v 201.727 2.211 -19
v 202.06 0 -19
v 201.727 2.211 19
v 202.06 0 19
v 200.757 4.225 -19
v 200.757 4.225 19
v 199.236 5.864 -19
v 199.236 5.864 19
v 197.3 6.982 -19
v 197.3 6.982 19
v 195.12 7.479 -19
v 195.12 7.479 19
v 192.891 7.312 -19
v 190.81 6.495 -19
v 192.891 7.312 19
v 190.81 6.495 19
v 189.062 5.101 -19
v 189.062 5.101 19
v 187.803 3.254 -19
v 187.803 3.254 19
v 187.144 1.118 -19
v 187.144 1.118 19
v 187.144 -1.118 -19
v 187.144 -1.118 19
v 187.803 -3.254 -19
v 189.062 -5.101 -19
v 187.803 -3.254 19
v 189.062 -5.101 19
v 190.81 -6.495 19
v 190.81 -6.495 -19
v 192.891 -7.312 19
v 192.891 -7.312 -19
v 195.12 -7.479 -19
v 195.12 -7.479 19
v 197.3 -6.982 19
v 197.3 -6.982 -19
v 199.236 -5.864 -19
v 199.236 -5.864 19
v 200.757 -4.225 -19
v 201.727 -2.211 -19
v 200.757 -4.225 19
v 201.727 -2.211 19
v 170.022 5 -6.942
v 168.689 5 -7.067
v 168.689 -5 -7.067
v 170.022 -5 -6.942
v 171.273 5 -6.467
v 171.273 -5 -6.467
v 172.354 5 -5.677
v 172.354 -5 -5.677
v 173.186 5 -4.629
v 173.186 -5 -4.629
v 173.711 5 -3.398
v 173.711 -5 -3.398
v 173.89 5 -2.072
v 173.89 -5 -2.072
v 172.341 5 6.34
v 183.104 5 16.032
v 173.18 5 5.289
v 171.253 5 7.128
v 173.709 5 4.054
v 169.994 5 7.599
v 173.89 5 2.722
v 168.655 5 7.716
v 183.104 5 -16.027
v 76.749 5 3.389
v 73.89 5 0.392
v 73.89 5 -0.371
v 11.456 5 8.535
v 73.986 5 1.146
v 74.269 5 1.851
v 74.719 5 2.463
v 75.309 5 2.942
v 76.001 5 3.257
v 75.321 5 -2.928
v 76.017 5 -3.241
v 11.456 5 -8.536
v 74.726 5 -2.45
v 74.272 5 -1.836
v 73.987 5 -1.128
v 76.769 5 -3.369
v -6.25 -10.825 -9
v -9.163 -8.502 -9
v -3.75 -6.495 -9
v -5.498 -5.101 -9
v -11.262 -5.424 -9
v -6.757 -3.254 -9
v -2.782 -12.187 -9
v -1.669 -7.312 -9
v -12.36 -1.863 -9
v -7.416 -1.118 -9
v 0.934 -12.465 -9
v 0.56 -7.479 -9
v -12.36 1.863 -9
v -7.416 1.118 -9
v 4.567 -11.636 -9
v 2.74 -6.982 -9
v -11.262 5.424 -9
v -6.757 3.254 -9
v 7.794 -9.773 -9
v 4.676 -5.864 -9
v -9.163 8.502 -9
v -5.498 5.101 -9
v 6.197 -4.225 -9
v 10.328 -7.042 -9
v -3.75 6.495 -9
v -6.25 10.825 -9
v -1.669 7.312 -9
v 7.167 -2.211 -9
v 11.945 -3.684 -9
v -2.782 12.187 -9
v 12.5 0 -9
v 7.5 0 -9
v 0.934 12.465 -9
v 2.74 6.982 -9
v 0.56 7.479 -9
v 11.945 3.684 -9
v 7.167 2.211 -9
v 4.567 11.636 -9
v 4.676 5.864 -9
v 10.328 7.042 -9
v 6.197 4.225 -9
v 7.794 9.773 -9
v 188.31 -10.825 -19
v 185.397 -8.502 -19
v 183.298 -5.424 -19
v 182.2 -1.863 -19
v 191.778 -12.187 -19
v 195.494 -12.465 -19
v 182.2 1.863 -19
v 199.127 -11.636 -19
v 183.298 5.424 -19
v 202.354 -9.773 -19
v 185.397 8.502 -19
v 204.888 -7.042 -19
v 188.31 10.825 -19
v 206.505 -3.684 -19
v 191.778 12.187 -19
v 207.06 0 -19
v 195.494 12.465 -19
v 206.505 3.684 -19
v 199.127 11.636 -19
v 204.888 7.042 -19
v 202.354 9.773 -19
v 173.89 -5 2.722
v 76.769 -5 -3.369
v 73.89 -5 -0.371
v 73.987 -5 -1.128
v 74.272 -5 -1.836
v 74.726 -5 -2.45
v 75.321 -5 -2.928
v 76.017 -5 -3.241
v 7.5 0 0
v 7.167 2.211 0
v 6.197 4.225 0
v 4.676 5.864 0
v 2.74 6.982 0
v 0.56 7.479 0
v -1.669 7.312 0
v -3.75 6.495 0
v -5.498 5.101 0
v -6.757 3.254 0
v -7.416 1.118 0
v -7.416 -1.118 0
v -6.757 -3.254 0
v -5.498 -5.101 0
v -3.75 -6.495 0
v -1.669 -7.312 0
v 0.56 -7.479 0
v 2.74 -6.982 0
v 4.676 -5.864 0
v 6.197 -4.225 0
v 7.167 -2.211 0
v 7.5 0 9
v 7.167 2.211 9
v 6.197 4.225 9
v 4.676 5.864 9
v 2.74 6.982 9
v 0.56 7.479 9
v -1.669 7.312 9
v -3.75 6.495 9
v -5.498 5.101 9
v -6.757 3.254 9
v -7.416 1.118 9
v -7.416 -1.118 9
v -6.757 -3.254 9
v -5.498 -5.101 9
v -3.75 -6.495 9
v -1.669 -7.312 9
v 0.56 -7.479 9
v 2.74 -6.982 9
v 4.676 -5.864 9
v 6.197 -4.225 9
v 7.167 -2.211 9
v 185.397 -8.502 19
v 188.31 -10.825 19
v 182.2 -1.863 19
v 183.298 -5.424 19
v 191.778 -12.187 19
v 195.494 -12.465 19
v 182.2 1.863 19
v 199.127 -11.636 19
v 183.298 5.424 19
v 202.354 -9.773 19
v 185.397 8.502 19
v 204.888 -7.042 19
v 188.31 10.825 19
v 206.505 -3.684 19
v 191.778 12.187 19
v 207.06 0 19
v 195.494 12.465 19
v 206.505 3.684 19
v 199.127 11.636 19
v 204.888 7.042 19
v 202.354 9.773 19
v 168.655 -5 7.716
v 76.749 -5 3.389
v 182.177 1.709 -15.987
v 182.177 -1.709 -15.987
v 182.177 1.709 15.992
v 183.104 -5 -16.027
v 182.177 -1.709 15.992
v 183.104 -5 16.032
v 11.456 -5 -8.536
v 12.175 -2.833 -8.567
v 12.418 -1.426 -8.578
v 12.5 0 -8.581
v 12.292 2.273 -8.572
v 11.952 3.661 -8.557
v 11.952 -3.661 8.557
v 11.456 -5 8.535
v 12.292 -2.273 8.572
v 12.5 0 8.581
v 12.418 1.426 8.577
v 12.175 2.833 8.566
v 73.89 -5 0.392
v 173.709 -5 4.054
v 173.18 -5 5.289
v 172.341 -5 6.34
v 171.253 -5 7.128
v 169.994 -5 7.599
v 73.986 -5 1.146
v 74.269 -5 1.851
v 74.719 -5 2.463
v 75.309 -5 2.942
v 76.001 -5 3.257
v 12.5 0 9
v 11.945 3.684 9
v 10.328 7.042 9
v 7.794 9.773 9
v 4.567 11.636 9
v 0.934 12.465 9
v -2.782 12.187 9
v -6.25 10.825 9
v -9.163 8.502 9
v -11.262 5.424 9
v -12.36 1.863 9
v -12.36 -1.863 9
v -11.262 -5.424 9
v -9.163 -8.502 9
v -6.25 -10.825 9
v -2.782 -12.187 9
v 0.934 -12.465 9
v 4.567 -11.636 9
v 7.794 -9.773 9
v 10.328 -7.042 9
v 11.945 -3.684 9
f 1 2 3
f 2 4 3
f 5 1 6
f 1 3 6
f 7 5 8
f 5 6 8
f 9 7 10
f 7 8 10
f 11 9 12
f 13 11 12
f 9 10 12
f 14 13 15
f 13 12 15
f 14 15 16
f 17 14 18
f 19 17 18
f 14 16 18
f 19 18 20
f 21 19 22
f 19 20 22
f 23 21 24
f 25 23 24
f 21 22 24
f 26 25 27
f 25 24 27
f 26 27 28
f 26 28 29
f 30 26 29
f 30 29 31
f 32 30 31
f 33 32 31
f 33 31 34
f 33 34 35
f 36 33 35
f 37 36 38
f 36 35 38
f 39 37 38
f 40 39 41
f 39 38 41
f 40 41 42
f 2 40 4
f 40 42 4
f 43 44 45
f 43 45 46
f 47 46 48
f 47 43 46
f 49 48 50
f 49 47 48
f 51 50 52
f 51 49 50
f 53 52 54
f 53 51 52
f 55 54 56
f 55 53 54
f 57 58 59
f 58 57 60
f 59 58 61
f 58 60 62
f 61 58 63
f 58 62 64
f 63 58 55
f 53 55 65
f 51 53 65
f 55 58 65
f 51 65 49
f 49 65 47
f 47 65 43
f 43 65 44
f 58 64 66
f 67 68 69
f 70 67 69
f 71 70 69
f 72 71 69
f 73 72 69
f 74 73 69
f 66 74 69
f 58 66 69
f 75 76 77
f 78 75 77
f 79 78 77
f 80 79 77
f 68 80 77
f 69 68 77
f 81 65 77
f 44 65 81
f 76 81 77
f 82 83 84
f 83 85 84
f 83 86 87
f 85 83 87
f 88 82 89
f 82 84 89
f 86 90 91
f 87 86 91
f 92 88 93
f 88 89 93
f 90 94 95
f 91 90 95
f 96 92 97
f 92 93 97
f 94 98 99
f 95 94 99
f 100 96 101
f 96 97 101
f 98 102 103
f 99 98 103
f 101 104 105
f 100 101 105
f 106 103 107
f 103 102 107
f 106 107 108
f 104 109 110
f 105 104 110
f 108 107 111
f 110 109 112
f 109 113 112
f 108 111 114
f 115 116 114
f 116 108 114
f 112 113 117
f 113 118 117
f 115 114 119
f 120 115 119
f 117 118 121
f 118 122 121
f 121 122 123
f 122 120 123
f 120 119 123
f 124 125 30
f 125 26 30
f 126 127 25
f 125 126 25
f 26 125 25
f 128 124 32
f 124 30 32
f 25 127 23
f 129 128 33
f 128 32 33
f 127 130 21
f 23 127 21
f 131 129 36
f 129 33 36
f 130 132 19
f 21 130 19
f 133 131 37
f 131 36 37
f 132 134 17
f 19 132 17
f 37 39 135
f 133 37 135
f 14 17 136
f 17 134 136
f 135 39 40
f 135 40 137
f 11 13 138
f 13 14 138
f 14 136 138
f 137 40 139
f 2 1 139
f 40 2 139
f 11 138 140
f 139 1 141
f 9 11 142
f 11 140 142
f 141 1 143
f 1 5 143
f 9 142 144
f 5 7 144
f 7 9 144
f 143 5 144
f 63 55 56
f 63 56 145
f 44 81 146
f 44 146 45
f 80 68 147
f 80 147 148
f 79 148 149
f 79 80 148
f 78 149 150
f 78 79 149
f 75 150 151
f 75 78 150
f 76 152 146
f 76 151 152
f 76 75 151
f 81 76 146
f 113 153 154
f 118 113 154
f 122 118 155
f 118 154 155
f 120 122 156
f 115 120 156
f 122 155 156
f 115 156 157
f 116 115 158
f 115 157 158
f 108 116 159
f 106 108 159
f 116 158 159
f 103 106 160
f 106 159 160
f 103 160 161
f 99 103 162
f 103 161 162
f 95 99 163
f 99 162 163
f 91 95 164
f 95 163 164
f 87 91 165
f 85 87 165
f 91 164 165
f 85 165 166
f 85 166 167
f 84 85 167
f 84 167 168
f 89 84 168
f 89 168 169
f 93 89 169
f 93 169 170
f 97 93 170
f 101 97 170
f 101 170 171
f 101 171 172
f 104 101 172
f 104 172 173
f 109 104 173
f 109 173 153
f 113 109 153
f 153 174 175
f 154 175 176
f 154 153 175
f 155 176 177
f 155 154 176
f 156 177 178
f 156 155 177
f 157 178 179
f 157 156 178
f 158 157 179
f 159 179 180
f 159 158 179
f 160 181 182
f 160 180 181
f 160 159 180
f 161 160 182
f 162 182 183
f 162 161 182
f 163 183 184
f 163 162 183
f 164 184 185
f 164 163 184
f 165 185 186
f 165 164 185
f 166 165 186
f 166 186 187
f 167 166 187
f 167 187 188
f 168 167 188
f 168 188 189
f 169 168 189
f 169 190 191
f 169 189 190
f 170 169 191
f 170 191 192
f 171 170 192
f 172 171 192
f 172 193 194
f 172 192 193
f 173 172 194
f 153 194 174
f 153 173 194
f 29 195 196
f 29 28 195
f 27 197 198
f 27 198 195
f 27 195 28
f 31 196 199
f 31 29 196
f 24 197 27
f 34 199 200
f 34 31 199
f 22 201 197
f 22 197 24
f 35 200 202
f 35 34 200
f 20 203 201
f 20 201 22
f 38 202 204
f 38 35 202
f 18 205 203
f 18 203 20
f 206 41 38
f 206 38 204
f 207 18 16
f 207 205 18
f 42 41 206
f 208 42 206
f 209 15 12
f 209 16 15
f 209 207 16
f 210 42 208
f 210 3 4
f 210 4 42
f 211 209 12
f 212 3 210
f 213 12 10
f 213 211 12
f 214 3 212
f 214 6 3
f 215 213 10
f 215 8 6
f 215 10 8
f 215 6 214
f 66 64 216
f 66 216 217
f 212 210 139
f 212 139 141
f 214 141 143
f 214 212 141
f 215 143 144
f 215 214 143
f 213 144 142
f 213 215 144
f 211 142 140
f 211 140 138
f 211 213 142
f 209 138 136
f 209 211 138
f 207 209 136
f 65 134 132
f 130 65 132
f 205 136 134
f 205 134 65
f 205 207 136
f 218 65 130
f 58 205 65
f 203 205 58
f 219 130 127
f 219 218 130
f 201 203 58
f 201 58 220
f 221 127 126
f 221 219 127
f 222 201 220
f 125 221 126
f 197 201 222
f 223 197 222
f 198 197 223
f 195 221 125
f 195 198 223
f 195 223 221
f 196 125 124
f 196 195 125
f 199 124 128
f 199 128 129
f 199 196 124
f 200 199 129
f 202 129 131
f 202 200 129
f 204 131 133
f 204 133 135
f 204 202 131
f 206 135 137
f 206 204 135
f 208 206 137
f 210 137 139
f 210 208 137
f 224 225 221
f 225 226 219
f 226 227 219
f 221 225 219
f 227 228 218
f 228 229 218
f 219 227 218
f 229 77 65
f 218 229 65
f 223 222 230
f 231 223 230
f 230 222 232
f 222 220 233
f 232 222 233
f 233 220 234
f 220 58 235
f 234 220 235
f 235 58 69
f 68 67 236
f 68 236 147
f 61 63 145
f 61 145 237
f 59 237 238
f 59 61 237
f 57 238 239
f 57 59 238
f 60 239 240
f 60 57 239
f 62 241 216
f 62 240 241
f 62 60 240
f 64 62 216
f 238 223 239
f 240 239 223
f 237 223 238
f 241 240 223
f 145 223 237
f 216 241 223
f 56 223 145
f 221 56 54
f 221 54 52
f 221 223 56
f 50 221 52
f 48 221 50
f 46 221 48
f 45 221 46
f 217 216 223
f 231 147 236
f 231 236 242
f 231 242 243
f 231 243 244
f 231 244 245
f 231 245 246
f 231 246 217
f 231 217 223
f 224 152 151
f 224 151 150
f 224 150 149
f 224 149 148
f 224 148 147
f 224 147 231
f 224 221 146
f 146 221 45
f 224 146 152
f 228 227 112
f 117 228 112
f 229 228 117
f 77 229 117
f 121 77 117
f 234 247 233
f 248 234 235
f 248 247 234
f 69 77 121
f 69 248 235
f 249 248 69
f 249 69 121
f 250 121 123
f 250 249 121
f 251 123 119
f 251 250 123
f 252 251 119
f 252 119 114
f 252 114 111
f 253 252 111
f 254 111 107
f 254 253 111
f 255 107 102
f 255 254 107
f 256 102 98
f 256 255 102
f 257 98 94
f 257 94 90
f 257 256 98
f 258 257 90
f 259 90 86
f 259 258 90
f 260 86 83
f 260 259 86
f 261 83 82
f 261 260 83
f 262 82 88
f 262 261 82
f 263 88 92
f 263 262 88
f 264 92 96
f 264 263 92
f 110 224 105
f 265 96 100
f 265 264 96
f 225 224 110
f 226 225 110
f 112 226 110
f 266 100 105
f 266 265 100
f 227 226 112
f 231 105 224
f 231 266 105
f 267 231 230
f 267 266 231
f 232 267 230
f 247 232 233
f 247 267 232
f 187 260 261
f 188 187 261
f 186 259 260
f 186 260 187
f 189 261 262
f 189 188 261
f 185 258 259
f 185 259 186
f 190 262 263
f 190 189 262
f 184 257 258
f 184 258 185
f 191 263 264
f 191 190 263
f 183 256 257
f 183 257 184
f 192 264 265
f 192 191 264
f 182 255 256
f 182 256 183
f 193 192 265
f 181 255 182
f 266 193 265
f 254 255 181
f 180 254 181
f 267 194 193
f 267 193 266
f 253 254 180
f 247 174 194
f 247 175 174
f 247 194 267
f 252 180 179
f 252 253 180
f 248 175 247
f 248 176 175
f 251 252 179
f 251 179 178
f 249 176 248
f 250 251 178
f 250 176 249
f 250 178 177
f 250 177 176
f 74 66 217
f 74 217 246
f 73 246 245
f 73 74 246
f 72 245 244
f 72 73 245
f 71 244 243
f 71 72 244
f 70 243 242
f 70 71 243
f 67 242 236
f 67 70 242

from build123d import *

# Parameters (mm, degrees)
SKETCH1_R           = 7.5
BOSS_EXTRUDE1_DEPTH = 9
SKETCH2_R           = 7.5
BOSS_EXTRUDE2_DEPTH = 19
BOSS_EXTRUDE3_DEPTH = 5
SKETCH4_R           = 12.5
BOSS_EXTRUDE4_DEPTH = 9
SKETCH6_R           = 12.5
BOSS_EXTRUDE5_DEPTH = 19
SKETCH7_R           = 7.5
CUT_EXTRUDE1_DEPTH  = 19
CUT_EXTRUDE2_DEPTH  = 19


with BuildPart() as part:
    # Sketch1 → Boss-Extrude1 (new body, symmetric)
    with BuildSketch(Plane.XY):
        Circle(SKETCH1_R)
    extrude(amount=BOSS_EXTRUDE1_DEPTH, both=True)



with BuildPart() as body_2:
    # Sketch2 → Boss-Extrude2 (new body, symmetric)
    with BuildSketch(Plane.XY):
        with Locations((194.56, 0)):
            Circle(SKETCH2_R)
    extrude(amount=BOSS_EXTRUDE2_DEPTH, both=True)


with BuildPart() as body_3:
    # Sketch3 → Boss-Extrude3 (new body, symmetric)
    with BuildSketch(Plane(origin=(0, 0, 0), x_dir=(1, 0, 0), z_dir=(0, 1, 0))):
        Polygon((7.5, 8.362970839), (187.06, 16.2), (187.06, -16.20477539), (7.5, -8.362286729), align=None)
    extrude(amount=BOSS_EXTRUDE3_DEPTH, both=True)


with BuildPart() as part_1:
    add(part.part)

    add(body_3.part)  # Boss-Extrude4 merges body 3
    # Sketch4 → Boss-Extrude4 (add, symmetric)
    with BuildSketch(Plane.XY):
        Circle(SKETCH4_R)
    extrude(amount=BOSS_EXTRUDE4_DEPTH, both=True)


    add(body_2.part)  # Boss-Extrude5 merges body 2
    # Sketch6 → Boss-Extrude5 (add, symmetric)
    with BuildSketch(Plane.XY):
        with Locations((194.56, 0)):
            Circle(SKETCH6_R)
    extrude(amount=BOSS_EXTRUDE5_DEPTH, both=True)

    # Sketch7 → Cut-Extrude1 (cut, symmetric)
    with BuildSketch(Plane.XY):
        Circle(SKETCH7_R)
        with Locations((194.56, 0)):
            Circle(SKETCH7_R)
    extrude(amount=CUT_EXTRUDE1_DEPTH, both=True, mode=Mode.SUBTRACT)

    # Sketch8 → Cut-Extrude2 (cut, symmetric)
    with BuildSketch(Plane(origin=(0, 5, 0), x_dir=(1, 0, 0), z_dir=(0, 1, 0))):
        with BuildLine():
            Line((76.769384169, 3.36885549), (168.688973616, 7.067498603))
            ThreePointArc((168.688973616, 7.067498603), (172.353731231, 5.677448491), (173.89, 2.071541398))
            Line((173.89, 2.071541398), (173.89, -2.721863896))
            ThreePointArc((173.89, -2.721863896), (172.341389234, -6.33958588), (168.654835057, -7.716330579))
            Line((168.654835057, -7.716330579), (76.748901034, -3.388930862))
            ThreePointArc((76.748901034, -3.388930862), (74.719366809, -2.463084392), (73.89, -0.392250852))
            Line((73.89, -0.392250852), (73.89, 0.371281167))
            ThreePointArc((73.89, 0.371281167), (74.726455744, 2.449519905), (76.769384169, 3.36885549))
        make_face()
    extrude(amount=CUT_EXTRUDE2_DEPTH, both=True, mode=Mode.SUBTRACT)


solid = part_1.part
